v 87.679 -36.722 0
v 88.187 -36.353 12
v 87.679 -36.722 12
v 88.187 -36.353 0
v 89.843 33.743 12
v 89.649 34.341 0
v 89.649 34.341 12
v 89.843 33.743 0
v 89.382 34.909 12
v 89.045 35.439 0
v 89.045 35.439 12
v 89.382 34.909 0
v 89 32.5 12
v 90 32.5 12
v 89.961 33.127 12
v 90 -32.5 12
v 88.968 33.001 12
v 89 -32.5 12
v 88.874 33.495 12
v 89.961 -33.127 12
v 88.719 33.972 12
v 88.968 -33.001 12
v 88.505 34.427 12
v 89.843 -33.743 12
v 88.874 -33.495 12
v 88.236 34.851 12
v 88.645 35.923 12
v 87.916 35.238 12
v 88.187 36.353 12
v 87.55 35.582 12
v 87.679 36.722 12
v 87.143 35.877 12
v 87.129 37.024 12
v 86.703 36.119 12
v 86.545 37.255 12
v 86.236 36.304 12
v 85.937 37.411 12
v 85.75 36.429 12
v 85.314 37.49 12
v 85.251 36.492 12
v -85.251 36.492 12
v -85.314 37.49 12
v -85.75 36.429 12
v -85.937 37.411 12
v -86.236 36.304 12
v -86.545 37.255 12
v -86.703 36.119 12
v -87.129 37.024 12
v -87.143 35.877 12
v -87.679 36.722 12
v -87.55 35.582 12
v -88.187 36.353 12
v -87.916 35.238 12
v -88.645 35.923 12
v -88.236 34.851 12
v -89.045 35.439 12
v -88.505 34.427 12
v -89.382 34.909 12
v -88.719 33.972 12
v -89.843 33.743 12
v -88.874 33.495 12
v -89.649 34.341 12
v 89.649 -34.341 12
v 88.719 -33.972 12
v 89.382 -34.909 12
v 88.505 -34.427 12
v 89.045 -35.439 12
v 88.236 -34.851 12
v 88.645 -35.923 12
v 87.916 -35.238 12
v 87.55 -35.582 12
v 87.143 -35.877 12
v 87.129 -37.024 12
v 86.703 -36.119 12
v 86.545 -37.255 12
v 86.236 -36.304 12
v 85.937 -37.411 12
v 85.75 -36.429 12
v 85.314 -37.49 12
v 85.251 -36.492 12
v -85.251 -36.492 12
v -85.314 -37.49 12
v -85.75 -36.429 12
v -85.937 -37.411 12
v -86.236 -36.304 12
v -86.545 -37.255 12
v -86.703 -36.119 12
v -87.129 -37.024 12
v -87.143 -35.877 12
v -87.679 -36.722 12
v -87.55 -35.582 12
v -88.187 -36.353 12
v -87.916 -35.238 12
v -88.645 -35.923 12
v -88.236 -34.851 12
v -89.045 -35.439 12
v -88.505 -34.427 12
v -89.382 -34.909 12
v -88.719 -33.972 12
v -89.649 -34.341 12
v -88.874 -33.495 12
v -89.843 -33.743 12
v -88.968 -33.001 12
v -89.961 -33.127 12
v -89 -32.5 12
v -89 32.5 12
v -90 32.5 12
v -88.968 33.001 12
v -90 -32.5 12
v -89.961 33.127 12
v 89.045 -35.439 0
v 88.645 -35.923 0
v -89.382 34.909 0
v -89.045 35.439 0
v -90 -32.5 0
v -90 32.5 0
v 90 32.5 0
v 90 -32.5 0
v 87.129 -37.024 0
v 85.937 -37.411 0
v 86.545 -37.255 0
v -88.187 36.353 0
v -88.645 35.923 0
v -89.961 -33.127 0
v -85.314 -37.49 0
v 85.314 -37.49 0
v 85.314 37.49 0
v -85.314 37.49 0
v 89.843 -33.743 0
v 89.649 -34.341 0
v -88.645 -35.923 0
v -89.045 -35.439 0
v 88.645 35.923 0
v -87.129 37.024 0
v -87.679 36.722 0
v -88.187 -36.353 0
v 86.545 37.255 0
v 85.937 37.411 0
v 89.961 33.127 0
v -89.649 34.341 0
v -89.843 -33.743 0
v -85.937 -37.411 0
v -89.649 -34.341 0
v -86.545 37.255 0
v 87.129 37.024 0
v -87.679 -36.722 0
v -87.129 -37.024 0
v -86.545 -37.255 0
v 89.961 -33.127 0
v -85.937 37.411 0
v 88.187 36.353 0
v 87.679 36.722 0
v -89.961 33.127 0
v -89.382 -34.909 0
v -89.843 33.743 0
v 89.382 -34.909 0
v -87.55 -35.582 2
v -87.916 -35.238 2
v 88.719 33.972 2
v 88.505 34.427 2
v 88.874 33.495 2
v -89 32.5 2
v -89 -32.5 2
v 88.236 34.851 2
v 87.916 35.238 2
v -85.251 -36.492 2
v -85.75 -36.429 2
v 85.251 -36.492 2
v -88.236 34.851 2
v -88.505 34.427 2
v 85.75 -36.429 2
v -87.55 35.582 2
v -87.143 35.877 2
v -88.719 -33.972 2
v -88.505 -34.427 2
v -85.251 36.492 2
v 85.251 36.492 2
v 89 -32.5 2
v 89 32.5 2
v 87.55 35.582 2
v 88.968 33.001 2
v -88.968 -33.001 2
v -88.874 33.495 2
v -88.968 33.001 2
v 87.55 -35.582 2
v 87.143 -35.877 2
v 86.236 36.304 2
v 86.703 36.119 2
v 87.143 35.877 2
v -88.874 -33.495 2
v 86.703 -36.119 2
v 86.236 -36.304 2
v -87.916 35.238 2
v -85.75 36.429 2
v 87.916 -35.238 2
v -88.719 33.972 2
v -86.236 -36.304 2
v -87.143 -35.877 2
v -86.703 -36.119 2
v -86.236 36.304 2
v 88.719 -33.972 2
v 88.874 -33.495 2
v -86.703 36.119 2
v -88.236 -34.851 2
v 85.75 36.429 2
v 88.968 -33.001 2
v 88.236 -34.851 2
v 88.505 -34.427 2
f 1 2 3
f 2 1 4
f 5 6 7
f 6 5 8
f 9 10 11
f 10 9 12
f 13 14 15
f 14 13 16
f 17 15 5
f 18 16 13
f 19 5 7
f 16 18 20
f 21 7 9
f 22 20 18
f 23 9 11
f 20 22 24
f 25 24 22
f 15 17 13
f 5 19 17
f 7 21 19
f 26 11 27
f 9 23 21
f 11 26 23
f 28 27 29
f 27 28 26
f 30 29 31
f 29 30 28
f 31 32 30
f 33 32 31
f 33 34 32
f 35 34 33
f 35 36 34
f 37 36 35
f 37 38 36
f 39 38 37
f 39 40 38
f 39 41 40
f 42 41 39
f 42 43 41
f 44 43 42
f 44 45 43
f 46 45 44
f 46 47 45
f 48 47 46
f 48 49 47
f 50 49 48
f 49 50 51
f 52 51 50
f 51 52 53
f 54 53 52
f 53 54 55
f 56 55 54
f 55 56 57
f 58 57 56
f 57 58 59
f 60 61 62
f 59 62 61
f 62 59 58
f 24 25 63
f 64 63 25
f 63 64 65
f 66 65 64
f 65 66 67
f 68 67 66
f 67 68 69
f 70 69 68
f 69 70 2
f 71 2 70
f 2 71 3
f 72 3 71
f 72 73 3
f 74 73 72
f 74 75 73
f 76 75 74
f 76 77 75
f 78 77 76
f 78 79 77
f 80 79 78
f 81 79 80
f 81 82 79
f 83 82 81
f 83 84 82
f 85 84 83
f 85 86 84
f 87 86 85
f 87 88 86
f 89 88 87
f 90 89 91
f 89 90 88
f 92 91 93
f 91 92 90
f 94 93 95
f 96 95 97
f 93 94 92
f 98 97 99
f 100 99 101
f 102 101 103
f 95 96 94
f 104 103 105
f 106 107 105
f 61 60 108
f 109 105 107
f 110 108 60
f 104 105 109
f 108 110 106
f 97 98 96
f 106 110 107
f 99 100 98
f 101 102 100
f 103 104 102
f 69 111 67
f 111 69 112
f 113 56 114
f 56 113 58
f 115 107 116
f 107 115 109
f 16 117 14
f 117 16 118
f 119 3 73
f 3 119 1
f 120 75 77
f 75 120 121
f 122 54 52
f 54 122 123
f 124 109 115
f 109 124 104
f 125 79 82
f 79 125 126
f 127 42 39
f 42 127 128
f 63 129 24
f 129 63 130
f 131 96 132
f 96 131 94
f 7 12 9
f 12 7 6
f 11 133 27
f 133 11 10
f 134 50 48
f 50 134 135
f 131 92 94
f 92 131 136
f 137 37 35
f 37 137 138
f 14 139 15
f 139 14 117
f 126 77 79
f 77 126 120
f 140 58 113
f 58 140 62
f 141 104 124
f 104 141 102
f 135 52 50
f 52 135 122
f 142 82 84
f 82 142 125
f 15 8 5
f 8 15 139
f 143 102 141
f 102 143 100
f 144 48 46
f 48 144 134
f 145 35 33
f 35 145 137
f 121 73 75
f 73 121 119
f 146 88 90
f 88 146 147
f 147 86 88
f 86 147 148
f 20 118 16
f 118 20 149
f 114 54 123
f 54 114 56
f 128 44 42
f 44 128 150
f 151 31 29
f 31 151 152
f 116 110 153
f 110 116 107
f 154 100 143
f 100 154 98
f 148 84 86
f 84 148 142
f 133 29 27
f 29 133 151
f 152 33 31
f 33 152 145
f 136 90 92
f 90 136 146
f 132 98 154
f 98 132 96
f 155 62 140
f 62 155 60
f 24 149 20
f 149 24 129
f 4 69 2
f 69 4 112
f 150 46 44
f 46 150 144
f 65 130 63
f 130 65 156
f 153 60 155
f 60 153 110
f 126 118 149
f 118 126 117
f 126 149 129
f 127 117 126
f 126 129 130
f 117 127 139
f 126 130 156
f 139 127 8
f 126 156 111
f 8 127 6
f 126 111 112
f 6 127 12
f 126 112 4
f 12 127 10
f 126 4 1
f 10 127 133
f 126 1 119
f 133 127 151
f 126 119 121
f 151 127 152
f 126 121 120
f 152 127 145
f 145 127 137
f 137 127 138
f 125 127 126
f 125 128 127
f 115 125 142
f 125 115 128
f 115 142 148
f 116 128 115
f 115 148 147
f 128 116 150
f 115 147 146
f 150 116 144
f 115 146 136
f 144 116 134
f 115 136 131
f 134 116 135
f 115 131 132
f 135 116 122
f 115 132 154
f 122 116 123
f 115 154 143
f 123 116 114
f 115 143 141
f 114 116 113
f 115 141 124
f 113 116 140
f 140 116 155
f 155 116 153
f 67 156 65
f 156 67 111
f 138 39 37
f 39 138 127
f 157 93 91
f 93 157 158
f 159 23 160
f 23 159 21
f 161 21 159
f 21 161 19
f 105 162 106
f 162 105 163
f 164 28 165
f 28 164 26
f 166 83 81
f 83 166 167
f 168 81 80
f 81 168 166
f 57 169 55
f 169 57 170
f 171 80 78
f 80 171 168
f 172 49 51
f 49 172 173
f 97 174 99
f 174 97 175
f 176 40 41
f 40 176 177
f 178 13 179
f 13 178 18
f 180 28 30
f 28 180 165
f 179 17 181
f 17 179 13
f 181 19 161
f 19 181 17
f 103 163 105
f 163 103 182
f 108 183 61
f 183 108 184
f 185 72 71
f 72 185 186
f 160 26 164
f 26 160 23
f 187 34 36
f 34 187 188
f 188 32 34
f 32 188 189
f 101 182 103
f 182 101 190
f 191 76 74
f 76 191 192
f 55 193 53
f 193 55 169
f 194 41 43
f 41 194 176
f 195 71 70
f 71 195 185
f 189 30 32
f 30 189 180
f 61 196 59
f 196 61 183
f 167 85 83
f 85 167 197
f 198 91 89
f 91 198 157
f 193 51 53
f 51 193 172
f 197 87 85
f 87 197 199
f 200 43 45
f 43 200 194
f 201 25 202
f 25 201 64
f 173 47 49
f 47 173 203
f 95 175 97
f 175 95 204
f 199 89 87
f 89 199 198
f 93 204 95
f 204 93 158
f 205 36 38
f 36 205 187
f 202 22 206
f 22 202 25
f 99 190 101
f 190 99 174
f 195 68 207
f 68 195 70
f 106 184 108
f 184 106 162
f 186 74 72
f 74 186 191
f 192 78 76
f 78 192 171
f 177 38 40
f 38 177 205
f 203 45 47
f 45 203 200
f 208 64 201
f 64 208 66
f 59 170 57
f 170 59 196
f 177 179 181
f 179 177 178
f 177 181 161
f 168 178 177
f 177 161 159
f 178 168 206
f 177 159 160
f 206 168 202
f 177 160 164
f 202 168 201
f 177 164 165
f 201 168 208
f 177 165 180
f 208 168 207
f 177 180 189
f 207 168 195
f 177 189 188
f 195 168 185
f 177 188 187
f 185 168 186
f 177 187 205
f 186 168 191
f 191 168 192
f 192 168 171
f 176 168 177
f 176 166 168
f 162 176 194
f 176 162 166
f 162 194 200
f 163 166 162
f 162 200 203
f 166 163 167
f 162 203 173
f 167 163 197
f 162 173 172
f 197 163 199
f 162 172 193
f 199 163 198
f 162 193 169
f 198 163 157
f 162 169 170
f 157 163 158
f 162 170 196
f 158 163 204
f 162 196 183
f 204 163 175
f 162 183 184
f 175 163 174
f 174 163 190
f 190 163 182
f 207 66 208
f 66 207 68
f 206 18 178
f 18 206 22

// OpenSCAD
$fn = 50;


difference() {
	union() {
		hull() {
			translate(v = [-85.0000000000, 32.5000000000, 0]) {
				cylinder(h = 12, r = 5);
			}
			translate(v = [85.0000000000, 32.5000000000, 0]) {
				cylinder(h = 12, r = 5);
			}
			translate(v = [-85.0000000000, -32.5000000000, 0]) {
				cylinder(h = 12, r = 5);
			}
			translate(v = [85.0000000000, -32.5000000000, 0]) {
				cylinder(h = 12, r = 5);
			}
		}
	}
	union() {
		translate(v = [0, 0, 2]) {
			hull() {
				translate(v = [-85.0000000000, 32.5000000000, 0]) {
					cylinder(h = 10, r = 4);
				}
				translate(v = [85.0000000000, 32.5000000000, 0]) {
					cylinder(h = 10, r = 4);
				}
				translate(v = [-85.0000000000, -32.5000000000, 0]) {
					cylinder(h = 10, r = 4);
				}
				translate(v = [85.0000000000, -32.5000000000, 0]) {
					cylinder(h = 10, r = 4);
				}
			}
		}
	}
}
